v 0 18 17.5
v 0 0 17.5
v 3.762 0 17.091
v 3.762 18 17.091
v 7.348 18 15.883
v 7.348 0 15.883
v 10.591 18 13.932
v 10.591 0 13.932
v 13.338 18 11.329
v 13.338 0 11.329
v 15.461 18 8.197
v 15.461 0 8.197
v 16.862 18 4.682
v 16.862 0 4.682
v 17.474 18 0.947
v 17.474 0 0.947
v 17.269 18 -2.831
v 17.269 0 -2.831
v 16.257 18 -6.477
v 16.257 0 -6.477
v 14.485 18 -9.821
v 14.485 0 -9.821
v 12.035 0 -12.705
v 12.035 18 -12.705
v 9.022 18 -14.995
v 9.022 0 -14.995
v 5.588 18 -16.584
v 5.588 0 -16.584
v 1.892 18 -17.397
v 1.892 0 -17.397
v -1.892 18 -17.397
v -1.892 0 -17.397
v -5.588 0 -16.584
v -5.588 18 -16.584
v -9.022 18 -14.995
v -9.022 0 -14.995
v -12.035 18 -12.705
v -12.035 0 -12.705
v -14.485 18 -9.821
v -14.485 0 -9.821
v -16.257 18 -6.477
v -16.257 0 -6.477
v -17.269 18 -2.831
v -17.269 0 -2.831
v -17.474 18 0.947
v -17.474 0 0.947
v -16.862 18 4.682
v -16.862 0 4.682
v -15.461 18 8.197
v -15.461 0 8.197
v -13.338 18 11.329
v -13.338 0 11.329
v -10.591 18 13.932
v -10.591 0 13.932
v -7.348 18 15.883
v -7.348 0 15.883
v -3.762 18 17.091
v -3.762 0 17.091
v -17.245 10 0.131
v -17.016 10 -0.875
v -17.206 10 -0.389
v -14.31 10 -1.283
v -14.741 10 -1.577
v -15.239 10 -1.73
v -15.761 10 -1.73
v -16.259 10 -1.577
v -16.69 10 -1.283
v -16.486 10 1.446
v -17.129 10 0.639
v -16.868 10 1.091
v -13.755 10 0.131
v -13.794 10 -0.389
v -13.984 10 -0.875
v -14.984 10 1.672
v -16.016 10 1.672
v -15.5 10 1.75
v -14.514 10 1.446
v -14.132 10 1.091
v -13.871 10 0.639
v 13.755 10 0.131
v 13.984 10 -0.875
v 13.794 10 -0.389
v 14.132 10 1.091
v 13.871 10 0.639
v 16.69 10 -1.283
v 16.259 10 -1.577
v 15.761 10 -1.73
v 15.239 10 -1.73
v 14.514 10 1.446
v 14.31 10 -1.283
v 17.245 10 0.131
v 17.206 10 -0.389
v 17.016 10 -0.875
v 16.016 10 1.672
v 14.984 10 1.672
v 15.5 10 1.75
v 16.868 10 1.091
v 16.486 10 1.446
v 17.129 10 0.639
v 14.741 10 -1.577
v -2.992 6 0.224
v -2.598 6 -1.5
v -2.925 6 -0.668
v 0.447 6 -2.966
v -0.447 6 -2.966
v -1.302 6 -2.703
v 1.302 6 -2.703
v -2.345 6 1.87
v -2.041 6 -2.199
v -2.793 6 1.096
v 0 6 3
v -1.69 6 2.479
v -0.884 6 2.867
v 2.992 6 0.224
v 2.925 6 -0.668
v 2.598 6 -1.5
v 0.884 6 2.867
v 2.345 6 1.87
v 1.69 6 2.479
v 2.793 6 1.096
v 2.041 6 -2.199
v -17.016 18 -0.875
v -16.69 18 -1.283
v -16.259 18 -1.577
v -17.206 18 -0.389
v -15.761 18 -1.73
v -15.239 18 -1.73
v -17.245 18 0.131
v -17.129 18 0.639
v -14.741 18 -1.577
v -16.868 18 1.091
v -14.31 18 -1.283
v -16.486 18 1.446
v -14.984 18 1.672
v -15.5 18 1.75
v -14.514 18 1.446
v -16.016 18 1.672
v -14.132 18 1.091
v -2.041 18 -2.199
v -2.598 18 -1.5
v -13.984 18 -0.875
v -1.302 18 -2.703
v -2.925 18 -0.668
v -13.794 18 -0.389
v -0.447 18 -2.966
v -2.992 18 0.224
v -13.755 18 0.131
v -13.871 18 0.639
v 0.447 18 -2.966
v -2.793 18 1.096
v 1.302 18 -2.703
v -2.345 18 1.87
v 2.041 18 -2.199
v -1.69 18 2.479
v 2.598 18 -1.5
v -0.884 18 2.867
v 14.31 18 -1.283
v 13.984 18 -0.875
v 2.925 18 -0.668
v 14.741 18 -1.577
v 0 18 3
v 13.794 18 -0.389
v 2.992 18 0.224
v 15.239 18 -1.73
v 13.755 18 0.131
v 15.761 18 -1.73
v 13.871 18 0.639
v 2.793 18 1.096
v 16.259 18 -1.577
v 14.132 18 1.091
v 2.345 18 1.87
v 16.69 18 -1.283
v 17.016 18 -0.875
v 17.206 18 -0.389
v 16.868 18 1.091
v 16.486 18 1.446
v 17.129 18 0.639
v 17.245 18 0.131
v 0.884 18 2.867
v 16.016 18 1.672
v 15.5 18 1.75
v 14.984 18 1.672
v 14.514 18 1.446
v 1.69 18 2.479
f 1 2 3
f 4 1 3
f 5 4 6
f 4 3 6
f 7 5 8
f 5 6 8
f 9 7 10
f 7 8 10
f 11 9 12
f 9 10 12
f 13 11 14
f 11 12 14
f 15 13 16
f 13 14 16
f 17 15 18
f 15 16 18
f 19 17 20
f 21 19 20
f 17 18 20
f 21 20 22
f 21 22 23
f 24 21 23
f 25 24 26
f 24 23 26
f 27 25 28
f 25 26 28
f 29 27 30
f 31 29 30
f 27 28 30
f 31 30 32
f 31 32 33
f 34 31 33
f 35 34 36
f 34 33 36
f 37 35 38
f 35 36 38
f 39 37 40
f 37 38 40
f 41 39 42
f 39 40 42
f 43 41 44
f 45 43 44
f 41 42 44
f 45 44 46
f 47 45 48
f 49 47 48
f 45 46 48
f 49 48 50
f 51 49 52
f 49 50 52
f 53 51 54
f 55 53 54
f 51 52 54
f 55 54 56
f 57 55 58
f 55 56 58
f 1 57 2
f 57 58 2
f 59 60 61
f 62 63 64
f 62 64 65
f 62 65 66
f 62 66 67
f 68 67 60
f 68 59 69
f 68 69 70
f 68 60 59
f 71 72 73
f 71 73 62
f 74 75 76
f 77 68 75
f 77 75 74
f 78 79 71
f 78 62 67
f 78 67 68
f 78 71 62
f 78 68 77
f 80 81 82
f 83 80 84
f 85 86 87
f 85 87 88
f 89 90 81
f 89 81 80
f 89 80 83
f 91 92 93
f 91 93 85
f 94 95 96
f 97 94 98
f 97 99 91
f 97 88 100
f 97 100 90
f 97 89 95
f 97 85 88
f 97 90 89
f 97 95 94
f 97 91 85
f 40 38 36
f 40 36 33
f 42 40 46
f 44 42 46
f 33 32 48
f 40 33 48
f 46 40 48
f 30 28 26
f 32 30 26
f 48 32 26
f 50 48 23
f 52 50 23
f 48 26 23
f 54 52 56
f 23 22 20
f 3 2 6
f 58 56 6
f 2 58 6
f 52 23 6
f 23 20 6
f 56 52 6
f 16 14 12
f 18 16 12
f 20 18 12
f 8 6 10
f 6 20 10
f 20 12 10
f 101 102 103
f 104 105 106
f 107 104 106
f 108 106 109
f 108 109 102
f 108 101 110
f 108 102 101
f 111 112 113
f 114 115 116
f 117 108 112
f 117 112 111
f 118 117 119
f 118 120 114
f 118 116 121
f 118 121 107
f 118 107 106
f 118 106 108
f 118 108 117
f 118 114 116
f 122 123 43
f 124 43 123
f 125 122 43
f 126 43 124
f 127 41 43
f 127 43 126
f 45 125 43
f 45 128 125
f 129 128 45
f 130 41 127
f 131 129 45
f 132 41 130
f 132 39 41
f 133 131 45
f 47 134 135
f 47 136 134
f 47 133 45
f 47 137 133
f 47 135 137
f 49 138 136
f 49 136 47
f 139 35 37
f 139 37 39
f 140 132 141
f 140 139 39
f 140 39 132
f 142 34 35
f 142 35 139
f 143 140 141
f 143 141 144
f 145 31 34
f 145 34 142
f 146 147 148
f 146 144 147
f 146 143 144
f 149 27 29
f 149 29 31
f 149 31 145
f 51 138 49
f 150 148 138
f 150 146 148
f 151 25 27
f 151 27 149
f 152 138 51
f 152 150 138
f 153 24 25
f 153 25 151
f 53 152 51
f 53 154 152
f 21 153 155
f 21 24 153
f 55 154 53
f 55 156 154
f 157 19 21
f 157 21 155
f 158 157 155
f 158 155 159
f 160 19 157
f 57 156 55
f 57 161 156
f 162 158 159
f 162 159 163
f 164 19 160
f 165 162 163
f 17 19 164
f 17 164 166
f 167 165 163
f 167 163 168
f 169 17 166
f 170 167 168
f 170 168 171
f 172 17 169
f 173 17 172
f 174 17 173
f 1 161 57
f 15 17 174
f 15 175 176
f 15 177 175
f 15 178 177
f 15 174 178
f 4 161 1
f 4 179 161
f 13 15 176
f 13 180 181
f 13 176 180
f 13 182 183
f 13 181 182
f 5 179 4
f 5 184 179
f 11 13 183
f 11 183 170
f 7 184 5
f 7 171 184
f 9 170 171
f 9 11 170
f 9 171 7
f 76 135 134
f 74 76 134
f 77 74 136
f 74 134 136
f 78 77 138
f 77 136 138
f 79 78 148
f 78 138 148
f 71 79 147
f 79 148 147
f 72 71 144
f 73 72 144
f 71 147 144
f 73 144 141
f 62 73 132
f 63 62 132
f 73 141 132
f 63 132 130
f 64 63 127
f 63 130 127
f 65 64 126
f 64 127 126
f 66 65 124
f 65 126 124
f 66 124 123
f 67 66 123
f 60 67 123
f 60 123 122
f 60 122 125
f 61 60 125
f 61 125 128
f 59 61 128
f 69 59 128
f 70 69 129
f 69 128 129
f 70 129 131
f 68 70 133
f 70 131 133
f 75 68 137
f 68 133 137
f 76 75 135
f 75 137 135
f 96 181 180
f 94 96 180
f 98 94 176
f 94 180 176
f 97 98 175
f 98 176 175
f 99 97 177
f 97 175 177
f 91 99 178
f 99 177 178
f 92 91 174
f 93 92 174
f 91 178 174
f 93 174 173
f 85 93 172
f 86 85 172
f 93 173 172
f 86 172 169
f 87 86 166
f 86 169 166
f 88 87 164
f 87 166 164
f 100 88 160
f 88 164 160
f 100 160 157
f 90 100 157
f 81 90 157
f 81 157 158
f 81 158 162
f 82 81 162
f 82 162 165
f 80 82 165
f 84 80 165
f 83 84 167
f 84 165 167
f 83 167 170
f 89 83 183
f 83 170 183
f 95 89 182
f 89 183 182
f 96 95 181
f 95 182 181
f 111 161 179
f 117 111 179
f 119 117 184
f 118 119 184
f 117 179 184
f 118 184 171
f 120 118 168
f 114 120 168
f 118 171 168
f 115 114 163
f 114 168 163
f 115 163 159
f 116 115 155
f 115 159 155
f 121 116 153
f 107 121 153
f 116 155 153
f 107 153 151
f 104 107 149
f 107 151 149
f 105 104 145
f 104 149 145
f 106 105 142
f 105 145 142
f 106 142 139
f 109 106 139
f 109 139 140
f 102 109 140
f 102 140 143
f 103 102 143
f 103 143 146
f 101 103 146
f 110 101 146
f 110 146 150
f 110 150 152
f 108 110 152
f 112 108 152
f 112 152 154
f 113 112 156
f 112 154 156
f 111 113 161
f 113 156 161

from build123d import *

# Parameters (mm, degrees)
SKETCH_1_R          = 17.5
EXTRUDE_1_DEPTH     = 18
SKETCH_2_R          = 3
CUT_EXTRUDE_1_DEPTH = 12
SKETCH_3_R          = 1.75
CUT_EXTRUDE_2_DEPTH = 8


with BuildPart() as part:
    # 草图1 → 凸台-拉伸1 (new body)
    with BuildSketch(Plane(origin=(0, 0, 0), x_dir=(1, 0, 0), z_dir=(0, 1, 0))):
        with Locations(Location((0, 0, 0), (0, 0, 270))):
            Circle(SKETCH_1_R)
    extrude(amount=EXTRUDE_1_DEPTH)

    # 草图2 → 切除-拉伸1 (cut)
    with BuildSketch(Plane(origin=(0, 18, 0), x_dir=(1, 0, 0), z_dir=(0, 1, 0))):
        with Locations(Location((0, 0, 0), (0, 0, 270))):
            Circle(SKETCH_2_R)
    extrude(amount=-CUT_EXTRUDE_1_DEPTH, mode=Mode.SUBTRACT)

    # 草图3 → 切除-拉伸2 (cut)
    with BuildSketch(Plane(origin=(0, 18, 0), x_dir=(1, 0, 0), z_dir=(0, 1, 0))):
        with Locations(Location((15.5, 0, 0), (0, 0, 270))):
            Circle(SKETCH_3_R)
        with Locations(Location((-15.5, 0, 0), (0, 0, 270))):
            Circle(SKETCH_3_R)
    extrude(amount=-CUT_EXTRUDE_2_DEPTH, mode=Mode.SUBTRACT)


solid = part.part
